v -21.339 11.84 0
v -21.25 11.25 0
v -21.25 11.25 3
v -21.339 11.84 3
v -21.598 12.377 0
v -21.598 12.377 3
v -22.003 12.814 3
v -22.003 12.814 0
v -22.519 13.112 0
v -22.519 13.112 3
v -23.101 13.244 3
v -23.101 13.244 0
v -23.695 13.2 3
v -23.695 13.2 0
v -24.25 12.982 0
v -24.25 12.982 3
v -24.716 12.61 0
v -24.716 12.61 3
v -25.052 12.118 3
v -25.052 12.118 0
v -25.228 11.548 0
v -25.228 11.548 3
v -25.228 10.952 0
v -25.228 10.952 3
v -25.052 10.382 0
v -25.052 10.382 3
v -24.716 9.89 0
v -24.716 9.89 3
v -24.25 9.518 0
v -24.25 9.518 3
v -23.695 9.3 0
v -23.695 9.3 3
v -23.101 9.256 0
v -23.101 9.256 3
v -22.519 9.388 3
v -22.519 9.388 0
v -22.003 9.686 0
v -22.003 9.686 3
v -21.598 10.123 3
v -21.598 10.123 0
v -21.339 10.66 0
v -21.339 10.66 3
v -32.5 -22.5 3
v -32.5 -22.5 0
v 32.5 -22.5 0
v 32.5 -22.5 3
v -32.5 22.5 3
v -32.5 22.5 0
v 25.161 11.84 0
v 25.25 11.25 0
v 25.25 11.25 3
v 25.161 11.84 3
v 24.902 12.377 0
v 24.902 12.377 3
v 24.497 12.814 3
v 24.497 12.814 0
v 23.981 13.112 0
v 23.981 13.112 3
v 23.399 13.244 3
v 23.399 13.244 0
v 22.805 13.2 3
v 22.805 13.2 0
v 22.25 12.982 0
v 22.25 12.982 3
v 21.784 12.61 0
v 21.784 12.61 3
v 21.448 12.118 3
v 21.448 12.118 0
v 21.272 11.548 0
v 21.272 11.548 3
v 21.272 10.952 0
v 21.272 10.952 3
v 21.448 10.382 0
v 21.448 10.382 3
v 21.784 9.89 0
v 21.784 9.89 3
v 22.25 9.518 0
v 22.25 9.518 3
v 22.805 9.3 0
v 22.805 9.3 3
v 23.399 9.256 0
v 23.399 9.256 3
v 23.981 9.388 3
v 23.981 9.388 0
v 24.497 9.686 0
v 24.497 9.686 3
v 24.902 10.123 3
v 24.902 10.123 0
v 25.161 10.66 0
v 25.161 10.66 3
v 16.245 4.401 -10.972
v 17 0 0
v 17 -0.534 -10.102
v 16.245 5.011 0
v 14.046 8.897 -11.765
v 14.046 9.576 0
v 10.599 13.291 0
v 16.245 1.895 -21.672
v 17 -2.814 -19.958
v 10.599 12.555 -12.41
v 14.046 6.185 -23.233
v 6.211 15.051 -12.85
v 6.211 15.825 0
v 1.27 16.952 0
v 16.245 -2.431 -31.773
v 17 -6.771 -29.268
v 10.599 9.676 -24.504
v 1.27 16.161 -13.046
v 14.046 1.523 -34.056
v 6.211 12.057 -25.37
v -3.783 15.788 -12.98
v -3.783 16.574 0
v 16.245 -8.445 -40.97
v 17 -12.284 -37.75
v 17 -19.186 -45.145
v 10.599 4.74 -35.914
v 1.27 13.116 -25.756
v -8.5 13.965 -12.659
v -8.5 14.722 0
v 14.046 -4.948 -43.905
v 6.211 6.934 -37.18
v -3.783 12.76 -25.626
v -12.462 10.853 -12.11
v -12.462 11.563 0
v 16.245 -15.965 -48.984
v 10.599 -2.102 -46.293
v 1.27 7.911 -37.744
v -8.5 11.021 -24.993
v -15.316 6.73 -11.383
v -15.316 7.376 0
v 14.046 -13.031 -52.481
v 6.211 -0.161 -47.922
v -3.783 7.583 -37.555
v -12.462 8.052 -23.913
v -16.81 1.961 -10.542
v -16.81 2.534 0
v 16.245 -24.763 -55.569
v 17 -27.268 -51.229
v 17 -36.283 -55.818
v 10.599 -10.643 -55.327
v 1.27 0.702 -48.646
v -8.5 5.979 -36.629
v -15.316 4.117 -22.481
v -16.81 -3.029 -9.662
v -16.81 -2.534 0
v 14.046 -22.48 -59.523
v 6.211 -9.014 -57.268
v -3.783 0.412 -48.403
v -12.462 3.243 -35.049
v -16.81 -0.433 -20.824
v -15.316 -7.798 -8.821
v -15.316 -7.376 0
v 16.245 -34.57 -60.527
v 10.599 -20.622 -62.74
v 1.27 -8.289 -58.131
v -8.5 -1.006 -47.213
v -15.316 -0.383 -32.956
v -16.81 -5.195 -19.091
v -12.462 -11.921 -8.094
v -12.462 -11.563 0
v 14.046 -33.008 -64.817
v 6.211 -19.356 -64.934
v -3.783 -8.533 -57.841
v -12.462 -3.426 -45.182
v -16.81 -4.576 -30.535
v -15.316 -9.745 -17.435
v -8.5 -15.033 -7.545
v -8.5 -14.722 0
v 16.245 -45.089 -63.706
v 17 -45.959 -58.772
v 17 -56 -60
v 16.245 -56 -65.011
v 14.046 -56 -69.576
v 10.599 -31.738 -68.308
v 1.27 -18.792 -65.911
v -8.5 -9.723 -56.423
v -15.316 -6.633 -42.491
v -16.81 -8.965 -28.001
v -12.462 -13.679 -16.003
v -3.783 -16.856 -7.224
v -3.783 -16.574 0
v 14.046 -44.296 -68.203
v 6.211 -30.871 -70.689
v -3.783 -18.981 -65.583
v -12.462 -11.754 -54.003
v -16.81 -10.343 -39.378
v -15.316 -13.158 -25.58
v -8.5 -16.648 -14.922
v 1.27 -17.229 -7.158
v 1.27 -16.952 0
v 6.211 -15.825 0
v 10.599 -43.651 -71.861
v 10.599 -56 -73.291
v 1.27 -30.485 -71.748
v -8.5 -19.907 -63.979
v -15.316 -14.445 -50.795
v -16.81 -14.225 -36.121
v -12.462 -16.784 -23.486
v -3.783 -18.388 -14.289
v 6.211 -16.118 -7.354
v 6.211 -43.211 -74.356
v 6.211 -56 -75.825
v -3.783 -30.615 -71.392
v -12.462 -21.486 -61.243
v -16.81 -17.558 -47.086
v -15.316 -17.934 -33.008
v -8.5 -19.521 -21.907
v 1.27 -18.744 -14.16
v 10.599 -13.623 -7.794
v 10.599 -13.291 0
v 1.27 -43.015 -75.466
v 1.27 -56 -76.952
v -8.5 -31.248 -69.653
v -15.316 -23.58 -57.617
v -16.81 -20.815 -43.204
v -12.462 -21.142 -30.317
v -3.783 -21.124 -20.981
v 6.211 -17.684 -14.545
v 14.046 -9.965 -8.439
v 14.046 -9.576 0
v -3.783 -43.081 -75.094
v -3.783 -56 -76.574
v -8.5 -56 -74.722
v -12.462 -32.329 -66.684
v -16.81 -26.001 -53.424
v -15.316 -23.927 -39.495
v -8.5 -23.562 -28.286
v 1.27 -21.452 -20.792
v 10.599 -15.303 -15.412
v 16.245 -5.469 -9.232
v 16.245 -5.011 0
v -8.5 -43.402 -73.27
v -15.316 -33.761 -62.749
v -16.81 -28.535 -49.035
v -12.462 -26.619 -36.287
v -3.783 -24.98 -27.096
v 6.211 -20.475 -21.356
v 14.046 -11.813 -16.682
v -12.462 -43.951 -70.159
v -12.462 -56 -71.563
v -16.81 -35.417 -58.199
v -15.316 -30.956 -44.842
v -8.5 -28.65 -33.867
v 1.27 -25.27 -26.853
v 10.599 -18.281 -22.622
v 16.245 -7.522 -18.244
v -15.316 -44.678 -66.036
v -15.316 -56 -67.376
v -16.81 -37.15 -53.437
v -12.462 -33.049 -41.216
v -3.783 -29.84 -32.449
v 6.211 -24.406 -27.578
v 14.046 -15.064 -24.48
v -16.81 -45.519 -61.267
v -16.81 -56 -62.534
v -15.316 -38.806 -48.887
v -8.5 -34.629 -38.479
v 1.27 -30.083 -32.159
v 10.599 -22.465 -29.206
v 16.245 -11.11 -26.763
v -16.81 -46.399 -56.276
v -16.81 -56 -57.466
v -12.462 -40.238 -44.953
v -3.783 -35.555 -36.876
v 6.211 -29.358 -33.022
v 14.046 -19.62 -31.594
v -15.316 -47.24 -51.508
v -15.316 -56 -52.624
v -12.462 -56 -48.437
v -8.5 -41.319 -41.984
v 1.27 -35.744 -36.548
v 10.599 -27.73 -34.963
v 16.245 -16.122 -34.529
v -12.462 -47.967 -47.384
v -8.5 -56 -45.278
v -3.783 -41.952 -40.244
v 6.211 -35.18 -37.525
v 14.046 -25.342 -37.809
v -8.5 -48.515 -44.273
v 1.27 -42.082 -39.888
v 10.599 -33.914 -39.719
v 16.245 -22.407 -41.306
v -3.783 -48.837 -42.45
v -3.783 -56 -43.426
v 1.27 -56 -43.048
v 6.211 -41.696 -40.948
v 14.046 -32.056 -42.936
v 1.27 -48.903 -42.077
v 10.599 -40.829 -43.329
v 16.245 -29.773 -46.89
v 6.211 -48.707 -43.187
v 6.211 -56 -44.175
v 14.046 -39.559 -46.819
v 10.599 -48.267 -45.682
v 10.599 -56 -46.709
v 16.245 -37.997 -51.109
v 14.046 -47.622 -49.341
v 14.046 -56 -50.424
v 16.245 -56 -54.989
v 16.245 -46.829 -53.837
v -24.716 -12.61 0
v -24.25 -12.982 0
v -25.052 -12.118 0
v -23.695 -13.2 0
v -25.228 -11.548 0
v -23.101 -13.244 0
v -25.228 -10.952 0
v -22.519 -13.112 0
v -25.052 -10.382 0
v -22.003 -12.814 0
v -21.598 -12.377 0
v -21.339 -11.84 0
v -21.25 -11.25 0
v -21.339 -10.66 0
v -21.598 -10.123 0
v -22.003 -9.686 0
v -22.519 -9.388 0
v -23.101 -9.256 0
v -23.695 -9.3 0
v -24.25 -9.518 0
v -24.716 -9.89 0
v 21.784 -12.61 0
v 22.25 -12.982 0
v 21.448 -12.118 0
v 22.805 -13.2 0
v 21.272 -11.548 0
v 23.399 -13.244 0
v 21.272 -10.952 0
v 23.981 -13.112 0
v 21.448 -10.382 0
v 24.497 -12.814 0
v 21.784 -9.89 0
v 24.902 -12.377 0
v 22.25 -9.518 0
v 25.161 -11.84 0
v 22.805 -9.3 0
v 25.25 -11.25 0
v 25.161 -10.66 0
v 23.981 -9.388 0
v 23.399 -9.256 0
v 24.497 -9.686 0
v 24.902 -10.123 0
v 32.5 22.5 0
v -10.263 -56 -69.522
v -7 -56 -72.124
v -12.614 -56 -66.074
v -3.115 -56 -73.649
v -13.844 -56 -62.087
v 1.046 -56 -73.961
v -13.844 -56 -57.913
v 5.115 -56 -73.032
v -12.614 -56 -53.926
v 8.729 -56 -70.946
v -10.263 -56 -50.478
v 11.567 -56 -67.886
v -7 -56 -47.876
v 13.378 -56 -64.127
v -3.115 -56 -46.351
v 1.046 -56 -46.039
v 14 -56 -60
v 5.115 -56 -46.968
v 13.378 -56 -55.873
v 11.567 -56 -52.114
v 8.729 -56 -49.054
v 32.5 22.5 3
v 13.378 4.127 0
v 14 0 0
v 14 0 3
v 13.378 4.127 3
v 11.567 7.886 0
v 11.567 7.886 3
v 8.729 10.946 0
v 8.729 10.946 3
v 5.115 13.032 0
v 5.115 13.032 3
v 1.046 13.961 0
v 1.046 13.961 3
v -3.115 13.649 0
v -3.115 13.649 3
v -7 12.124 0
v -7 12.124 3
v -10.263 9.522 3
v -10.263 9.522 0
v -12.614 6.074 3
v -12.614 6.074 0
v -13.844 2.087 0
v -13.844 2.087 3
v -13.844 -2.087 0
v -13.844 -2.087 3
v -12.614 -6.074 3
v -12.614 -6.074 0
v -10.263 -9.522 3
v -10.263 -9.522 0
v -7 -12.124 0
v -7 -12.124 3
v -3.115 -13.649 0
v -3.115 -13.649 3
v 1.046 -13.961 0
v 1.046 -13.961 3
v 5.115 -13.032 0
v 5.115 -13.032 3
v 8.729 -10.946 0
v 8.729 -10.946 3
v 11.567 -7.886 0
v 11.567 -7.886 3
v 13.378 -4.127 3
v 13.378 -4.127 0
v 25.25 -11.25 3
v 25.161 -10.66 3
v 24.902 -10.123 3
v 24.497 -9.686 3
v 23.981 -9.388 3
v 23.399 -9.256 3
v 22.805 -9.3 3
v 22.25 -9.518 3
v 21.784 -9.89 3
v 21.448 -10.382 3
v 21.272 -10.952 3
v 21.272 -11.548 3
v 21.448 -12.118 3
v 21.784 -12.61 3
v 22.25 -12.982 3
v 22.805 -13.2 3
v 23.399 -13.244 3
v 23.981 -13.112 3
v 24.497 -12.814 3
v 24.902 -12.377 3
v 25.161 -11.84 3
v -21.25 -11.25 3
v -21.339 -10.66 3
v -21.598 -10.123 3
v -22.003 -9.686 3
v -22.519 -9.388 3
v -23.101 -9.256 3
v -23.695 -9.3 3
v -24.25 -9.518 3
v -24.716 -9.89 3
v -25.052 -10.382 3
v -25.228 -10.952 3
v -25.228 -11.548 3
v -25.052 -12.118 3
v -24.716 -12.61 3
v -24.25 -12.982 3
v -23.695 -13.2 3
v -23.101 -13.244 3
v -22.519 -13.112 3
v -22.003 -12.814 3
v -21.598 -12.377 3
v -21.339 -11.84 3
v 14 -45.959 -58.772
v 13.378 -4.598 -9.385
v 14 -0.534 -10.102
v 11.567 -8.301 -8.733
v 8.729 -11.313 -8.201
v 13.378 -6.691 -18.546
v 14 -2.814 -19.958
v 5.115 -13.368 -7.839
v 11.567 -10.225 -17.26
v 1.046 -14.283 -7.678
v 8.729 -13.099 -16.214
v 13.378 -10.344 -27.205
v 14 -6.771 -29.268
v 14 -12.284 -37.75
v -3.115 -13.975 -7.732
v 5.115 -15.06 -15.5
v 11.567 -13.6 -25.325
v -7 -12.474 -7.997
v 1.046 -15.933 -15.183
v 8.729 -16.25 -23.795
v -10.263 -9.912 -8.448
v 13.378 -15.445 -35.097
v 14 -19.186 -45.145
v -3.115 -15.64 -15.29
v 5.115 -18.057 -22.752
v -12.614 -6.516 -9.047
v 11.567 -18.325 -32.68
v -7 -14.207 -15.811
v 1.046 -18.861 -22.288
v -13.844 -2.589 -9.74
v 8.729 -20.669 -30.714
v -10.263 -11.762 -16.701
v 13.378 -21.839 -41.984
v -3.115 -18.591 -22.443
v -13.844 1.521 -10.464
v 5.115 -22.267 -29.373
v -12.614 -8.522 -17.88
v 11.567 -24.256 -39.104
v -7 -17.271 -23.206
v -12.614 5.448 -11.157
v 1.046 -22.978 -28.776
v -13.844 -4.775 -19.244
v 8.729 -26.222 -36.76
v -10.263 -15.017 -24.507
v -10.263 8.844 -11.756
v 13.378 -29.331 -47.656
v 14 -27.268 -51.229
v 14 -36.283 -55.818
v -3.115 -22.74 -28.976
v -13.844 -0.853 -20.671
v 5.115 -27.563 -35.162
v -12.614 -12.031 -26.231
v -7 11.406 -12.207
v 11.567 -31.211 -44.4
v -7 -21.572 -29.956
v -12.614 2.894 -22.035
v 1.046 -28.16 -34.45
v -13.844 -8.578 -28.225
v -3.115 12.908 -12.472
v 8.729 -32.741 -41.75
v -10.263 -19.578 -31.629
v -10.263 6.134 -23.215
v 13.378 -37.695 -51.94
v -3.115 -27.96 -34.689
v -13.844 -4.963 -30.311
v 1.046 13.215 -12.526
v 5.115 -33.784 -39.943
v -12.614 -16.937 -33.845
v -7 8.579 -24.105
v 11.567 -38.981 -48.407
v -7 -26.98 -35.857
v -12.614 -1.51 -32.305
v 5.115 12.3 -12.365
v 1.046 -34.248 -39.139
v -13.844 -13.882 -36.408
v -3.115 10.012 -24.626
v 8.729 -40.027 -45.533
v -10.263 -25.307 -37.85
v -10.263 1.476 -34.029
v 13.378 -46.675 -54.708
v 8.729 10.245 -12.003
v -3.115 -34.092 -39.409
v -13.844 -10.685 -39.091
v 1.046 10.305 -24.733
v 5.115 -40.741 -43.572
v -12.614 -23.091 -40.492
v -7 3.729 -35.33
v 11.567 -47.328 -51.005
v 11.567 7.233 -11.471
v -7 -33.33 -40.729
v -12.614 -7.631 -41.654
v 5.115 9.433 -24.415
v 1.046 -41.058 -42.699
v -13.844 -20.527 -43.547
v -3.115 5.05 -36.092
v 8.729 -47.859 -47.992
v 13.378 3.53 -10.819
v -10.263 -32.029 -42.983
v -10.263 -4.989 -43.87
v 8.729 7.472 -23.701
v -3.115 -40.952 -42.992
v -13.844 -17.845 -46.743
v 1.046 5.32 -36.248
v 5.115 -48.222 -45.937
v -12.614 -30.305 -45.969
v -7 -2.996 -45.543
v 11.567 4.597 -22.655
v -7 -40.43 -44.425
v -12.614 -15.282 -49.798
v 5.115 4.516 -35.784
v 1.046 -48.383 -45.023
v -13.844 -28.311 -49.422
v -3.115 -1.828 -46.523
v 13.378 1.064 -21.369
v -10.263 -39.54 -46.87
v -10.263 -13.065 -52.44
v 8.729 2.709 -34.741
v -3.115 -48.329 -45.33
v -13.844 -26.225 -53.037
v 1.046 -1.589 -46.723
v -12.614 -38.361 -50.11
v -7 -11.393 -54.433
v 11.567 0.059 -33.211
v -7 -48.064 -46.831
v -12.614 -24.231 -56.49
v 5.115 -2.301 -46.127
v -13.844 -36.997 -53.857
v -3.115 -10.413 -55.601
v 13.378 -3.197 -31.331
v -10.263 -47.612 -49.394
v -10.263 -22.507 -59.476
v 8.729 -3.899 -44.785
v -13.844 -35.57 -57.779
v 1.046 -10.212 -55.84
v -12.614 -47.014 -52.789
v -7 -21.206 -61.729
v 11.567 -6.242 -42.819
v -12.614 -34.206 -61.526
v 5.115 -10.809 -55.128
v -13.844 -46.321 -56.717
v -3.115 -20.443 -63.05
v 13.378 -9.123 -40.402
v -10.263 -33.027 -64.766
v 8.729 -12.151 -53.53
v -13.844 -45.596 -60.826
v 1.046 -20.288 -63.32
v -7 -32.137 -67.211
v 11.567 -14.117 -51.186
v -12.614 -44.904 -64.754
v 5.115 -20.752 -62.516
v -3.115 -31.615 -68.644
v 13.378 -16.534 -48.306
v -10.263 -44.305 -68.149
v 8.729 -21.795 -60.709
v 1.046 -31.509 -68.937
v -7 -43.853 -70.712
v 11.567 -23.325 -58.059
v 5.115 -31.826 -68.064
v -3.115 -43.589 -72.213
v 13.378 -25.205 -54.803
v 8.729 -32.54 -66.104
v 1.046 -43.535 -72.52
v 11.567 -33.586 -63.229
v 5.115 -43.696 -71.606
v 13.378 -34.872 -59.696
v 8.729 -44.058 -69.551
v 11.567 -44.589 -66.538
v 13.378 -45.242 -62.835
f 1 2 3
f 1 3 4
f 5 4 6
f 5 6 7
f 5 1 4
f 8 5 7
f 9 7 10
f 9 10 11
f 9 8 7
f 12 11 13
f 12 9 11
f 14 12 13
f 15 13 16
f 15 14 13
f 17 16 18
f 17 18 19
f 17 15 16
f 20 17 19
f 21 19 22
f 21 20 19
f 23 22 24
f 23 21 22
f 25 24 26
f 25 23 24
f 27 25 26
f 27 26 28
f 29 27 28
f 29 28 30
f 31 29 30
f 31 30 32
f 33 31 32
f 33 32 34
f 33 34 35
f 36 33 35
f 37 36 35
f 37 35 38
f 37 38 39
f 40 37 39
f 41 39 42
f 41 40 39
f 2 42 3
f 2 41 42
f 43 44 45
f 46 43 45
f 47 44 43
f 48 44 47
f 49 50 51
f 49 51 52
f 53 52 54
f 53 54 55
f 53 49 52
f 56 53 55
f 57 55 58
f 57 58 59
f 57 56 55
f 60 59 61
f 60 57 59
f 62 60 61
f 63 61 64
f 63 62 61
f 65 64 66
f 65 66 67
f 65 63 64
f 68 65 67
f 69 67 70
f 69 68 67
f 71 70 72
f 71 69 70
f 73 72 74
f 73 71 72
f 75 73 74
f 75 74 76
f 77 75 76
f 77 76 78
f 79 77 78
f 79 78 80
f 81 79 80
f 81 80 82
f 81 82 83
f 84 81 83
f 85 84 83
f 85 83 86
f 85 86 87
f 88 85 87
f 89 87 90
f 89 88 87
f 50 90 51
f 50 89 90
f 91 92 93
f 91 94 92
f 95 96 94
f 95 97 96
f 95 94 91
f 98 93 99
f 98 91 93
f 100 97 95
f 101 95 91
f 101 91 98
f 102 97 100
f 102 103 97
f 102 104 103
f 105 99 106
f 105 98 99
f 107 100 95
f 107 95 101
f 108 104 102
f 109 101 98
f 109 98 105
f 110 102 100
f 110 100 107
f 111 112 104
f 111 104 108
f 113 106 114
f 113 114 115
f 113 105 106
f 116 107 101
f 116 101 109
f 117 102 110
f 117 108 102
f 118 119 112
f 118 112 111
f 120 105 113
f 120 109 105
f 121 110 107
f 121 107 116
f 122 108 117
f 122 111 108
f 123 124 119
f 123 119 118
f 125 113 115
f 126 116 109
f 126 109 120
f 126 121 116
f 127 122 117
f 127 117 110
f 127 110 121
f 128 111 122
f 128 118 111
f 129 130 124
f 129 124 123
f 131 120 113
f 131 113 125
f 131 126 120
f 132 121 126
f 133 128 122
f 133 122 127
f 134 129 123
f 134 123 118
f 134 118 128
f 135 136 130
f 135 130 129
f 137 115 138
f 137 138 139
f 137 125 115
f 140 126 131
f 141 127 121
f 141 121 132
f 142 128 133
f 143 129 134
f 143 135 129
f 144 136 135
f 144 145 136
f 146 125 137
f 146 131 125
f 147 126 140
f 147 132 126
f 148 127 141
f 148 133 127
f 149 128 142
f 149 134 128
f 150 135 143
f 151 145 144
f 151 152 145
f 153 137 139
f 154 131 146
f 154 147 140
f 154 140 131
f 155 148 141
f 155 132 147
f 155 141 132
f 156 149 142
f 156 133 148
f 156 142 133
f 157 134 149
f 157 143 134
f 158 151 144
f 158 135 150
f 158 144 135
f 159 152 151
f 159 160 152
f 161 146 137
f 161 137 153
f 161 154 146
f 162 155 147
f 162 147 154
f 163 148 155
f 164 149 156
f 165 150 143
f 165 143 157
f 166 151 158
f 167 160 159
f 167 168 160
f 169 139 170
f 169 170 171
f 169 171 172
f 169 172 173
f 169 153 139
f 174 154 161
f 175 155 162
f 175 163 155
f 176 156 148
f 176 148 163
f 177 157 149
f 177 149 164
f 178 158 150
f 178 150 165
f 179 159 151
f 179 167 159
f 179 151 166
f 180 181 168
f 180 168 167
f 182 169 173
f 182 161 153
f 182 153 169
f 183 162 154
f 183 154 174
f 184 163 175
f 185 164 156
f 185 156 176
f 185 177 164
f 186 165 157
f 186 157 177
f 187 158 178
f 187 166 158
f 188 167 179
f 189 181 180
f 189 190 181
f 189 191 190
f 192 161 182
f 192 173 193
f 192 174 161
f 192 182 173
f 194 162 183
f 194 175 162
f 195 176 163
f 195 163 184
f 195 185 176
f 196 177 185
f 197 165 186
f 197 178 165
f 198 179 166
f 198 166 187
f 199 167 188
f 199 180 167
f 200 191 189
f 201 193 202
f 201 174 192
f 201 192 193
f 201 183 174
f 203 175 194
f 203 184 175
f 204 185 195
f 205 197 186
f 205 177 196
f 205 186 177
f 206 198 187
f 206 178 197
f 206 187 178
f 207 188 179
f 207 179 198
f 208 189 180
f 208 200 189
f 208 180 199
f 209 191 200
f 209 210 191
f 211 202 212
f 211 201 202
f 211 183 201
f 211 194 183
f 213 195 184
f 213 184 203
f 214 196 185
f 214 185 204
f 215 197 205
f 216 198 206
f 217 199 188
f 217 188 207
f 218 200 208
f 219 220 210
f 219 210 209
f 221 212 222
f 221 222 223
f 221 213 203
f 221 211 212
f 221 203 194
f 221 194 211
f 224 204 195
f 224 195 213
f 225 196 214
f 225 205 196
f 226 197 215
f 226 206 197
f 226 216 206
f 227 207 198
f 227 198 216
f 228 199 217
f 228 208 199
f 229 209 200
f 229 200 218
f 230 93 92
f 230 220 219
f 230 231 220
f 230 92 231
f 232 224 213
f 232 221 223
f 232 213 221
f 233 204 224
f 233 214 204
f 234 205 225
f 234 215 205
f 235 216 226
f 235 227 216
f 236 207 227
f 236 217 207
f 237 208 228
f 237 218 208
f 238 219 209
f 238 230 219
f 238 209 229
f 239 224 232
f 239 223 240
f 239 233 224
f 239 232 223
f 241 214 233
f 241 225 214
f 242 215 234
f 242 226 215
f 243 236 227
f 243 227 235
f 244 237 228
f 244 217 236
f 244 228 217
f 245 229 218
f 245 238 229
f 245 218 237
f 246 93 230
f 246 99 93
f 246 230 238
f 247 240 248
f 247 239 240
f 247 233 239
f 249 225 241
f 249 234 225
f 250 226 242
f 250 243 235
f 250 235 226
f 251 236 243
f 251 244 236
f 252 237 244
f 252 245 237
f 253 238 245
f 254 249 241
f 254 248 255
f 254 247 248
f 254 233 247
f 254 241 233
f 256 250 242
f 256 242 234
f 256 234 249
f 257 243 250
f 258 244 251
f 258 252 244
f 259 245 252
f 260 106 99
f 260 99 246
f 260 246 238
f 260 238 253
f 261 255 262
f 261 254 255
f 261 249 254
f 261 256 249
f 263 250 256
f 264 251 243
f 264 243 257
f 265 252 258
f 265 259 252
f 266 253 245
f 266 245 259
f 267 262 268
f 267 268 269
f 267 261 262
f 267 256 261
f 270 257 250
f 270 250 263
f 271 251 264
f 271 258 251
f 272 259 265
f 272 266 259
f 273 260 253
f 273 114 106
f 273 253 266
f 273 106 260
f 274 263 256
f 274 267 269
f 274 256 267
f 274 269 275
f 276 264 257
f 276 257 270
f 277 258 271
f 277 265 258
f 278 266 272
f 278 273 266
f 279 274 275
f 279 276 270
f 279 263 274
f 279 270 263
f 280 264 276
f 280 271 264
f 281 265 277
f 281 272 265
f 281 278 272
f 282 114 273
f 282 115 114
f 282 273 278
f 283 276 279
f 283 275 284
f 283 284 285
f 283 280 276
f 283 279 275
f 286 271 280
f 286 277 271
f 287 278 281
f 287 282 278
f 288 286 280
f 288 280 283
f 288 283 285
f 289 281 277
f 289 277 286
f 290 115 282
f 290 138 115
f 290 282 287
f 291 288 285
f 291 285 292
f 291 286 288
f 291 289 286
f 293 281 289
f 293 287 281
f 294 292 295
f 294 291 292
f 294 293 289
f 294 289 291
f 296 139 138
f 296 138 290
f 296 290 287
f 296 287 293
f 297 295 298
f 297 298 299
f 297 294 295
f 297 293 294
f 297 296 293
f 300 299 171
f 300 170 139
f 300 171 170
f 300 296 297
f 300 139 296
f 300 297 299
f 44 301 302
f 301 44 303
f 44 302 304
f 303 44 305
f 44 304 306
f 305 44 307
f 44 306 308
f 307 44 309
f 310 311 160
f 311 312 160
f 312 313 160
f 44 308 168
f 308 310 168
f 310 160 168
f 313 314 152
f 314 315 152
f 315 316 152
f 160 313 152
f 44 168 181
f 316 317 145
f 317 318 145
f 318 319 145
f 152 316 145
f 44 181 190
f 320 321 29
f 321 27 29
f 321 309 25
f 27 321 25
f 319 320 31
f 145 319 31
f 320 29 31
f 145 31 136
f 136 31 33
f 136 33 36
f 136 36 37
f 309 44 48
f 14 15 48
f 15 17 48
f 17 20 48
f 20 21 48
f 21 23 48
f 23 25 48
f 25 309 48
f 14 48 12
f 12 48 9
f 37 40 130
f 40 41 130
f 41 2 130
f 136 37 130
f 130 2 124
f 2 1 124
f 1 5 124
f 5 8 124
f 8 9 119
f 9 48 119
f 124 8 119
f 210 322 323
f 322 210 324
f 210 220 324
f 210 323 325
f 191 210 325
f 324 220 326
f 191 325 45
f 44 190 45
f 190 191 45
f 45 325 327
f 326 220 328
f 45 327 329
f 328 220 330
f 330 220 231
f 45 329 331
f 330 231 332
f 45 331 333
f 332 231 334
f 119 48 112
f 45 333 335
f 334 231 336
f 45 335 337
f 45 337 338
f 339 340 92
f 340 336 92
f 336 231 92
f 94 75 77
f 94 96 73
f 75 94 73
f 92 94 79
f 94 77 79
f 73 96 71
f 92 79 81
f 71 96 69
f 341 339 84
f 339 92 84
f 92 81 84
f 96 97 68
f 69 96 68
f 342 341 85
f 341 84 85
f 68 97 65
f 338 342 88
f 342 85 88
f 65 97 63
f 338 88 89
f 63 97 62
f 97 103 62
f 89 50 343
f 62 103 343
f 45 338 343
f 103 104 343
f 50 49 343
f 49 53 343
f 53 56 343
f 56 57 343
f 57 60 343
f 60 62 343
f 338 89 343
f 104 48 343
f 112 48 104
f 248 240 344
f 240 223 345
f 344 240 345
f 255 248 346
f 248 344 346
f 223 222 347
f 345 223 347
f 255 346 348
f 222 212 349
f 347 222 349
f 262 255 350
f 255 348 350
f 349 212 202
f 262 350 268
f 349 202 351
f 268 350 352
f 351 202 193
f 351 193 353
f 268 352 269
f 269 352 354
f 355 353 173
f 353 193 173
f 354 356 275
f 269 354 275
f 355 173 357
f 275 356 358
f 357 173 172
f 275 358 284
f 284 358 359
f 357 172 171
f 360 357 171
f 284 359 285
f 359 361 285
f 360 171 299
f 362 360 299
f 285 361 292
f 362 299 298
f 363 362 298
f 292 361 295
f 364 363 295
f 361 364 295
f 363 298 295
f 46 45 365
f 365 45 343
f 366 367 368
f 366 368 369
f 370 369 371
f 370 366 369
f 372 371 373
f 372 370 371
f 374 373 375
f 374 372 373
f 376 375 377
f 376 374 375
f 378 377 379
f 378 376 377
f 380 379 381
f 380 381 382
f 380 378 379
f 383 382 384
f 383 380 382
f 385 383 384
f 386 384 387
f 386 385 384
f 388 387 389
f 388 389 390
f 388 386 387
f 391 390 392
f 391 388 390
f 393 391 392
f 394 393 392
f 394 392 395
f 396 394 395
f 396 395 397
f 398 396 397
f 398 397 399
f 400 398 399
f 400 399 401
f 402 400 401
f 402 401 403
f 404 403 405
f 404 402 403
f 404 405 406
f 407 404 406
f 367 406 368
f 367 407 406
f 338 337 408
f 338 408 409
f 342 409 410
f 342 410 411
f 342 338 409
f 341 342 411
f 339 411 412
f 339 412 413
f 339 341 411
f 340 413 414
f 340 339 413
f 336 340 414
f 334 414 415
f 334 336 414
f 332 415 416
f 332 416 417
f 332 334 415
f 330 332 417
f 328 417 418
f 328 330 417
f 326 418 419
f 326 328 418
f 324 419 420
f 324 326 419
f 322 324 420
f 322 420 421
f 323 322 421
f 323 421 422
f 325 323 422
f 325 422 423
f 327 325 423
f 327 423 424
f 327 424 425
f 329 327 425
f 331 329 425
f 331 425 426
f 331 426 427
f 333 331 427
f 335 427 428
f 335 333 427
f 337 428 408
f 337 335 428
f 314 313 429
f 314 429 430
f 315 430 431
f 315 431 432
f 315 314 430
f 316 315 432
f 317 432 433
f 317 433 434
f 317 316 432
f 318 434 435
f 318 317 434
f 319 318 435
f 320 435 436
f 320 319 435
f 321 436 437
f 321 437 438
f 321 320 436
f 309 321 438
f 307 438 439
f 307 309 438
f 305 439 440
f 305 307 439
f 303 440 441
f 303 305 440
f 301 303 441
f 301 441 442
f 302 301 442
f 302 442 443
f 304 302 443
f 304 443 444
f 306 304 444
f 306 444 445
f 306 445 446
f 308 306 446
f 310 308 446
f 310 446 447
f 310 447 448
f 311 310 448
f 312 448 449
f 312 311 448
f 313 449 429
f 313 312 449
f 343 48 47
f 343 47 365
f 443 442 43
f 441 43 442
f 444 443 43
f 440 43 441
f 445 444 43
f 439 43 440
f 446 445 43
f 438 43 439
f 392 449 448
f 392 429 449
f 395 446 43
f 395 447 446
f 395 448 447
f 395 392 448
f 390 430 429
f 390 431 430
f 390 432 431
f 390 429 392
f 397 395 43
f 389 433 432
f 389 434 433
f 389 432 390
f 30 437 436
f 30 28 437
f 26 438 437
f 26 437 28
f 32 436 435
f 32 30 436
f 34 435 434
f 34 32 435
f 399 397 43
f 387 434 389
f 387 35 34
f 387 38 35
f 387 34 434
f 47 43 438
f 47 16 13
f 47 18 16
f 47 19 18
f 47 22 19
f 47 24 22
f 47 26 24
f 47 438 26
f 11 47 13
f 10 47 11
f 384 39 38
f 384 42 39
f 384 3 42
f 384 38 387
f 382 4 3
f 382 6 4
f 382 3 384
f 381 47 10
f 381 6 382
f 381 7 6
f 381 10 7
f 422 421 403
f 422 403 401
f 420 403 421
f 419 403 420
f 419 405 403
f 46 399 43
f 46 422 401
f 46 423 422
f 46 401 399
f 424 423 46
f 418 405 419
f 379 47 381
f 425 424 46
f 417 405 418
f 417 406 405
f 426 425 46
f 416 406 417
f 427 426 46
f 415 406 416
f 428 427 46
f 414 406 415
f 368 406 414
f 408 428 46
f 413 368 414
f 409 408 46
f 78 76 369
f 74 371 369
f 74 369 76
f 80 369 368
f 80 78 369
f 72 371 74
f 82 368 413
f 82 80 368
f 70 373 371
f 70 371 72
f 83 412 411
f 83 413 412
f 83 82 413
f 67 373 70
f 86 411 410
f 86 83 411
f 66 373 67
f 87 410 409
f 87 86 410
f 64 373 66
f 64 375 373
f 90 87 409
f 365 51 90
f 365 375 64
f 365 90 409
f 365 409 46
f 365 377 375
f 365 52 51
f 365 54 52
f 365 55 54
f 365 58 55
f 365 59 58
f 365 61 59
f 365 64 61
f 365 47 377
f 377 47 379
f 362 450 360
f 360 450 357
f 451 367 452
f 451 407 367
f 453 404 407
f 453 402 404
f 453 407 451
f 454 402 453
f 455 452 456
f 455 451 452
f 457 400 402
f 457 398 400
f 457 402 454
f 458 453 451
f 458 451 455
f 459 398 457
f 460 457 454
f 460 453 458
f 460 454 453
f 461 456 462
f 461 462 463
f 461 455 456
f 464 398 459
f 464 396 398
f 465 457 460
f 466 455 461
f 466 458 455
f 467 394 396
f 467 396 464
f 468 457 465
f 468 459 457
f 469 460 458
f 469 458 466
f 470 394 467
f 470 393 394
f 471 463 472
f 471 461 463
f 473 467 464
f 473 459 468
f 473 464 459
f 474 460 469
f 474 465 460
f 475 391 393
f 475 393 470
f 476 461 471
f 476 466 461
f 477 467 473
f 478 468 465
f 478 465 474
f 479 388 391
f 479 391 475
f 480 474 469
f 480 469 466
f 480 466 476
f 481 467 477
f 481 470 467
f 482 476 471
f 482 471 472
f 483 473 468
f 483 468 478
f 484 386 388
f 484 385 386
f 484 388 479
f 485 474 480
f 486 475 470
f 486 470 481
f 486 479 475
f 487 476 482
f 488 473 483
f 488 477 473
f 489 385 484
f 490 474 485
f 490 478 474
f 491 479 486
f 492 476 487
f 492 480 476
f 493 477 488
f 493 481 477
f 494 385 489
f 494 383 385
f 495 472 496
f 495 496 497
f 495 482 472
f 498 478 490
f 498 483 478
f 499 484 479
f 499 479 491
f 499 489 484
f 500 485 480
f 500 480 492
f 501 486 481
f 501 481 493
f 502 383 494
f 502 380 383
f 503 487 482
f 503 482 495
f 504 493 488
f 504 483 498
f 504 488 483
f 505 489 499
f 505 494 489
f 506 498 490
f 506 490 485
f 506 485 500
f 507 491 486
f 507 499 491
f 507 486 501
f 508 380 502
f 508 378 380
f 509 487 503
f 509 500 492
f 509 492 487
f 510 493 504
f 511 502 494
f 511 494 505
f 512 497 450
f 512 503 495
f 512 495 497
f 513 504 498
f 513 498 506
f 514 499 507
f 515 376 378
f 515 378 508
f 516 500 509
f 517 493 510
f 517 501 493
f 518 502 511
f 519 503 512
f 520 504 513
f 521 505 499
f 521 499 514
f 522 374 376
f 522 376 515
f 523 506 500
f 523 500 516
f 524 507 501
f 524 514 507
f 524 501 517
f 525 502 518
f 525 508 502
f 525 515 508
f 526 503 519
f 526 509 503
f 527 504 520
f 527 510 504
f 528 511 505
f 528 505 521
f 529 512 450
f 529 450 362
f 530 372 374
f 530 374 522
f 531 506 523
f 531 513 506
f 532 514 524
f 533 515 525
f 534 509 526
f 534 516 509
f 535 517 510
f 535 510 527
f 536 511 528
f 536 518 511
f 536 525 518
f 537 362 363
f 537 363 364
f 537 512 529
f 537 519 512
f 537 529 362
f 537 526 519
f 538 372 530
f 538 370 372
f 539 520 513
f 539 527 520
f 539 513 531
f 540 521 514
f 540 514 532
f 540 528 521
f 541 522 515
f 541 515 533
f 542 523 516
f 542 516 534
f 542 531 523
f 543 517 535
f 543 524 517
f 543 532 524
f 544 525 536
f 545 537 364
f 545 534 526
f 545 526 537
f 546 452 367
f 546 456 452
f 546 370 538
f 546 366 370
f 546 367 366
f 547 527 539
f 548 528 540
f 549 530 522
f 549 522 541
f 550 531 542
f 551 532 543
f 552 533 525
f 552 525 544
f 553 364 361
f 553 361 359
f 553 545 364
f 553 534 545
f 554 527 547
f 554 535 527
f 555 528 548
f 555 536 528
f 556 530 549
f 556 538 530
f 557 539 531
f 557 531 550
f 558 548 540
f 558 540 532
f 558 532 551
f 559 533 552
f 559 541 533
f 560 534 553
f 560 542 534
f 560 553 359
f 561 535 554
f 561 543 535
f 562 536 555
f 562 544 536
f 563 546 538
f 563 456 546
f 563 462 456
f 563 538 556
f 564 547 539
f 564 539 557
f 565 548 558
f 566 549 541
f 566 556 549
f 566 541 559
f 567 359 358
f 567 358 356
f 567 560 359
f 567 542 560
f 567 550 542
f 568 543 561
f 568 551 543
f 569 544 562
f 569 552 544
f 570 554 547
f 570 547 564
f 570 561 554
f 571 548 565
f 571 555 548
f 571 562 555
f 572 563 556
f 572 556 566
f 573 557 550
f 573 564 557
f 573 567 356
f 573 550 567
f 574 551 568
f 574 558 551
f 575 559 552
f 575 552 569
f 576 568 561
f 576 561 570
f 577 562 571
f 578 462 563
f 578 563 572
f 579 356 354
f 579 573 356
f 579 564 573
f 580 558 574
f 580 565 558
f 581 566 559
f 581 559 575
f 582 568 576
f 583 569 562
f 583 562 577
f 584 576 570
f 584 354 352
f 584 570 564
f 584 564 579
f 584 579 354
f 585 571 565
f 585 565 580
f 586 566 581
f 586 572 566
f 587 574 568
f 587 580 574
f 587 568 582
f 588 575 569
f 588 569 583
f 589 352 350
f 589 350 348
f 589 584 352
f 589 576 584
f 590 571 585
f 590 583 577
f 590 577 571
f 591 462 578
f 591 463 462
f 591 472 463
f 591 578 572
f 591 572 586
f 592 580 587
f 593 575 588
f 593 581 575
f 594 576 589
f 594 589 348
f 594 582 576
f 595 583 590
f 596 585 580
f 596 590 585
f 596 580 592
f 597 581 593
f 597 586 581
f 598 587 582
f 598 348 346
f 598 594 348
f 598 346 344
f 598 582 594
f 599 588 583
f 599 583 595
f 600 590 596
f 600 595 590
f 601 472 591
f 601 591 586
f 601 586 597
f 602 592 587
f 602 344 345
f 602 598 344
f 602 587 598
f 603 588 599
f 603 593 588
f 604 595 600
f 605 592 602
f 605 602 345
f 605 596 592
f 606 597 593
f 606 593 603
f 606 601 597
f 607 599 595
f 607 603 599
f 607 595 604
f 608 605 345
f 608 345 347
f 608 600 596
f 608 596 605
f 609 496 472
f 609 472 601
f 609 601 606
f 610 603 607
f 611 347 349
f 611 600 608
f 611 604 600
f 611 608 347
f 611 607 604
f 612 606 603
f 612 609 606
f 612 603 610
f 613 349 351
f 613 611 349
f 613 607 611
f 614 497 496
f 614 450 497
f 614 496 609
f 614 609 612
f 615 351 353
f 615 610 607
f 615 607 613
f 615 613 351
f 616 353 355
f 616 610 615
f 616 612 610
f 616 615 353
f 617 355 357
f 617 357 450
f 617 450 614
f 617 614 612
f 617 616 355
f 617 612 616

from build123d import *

# Parameters (mm, degrees)
ESQUISSE1_R        = 17
ESQUISSE1_R_2      = 14
ESQUISSE3_W        = 65
ESQUISSE3_H        = 45
ESQUISSE3_R        = 14
ESQUISSE3_R_2      = 2
BOSS_EXTRU_1_DEPTH = 3


with BuildPart() as part:
    # Balayage1: sweep along a path in Esquisse2
    with BuildLine(Plane(origin=(0, 0, 0), x_dir=(0, 0, -1), z_dir=(1, 0, 0))) as balayage1_path:
        ThreePointArc((0, 0), (41.597979746, -15.573593129), (60, -56))
    # Esquisse1 → Balayage1 (sweep)
    with BuildSketch(Plane.XY):
        Circle(ESQUISSE1_R)
        Circle(ESQUISSE1_R_2, mode=Mode.SUBTRACT)
    sweep(path=balayage1_path.line)

    # Esquisse3 → Boss.-Extru.1 (add)
    with BuildSketch(Plane.XY):
        Rectangle(ESQUISSE3_W, ESQUISSE3_H)
        Circle(ESQUISSE3_R, mode=Mode.SUBTRACT)
        with Locations((-23.25, 11.25)):
            Circle(ESQUISSE3_R_2, mode=Mode.SUBTRACT)
        with Locations((-23.25, -11.25)):
            Circle(ESQUISSE3_R_2, mode=Mode.SUBTRACT)
        with Locations((23.25, -11.25)):
            Circle(ESQUISSE3_R_2, mode=Mode.SUBTRACT)
        with Locations((23.25, 11.25)):
            Circle(ESQUISSE3_R_2, mode=Mode.SUBTRACT)
    extrude(amount=BOSS_EXTRU_1_DEPTH)


solid = part.part
